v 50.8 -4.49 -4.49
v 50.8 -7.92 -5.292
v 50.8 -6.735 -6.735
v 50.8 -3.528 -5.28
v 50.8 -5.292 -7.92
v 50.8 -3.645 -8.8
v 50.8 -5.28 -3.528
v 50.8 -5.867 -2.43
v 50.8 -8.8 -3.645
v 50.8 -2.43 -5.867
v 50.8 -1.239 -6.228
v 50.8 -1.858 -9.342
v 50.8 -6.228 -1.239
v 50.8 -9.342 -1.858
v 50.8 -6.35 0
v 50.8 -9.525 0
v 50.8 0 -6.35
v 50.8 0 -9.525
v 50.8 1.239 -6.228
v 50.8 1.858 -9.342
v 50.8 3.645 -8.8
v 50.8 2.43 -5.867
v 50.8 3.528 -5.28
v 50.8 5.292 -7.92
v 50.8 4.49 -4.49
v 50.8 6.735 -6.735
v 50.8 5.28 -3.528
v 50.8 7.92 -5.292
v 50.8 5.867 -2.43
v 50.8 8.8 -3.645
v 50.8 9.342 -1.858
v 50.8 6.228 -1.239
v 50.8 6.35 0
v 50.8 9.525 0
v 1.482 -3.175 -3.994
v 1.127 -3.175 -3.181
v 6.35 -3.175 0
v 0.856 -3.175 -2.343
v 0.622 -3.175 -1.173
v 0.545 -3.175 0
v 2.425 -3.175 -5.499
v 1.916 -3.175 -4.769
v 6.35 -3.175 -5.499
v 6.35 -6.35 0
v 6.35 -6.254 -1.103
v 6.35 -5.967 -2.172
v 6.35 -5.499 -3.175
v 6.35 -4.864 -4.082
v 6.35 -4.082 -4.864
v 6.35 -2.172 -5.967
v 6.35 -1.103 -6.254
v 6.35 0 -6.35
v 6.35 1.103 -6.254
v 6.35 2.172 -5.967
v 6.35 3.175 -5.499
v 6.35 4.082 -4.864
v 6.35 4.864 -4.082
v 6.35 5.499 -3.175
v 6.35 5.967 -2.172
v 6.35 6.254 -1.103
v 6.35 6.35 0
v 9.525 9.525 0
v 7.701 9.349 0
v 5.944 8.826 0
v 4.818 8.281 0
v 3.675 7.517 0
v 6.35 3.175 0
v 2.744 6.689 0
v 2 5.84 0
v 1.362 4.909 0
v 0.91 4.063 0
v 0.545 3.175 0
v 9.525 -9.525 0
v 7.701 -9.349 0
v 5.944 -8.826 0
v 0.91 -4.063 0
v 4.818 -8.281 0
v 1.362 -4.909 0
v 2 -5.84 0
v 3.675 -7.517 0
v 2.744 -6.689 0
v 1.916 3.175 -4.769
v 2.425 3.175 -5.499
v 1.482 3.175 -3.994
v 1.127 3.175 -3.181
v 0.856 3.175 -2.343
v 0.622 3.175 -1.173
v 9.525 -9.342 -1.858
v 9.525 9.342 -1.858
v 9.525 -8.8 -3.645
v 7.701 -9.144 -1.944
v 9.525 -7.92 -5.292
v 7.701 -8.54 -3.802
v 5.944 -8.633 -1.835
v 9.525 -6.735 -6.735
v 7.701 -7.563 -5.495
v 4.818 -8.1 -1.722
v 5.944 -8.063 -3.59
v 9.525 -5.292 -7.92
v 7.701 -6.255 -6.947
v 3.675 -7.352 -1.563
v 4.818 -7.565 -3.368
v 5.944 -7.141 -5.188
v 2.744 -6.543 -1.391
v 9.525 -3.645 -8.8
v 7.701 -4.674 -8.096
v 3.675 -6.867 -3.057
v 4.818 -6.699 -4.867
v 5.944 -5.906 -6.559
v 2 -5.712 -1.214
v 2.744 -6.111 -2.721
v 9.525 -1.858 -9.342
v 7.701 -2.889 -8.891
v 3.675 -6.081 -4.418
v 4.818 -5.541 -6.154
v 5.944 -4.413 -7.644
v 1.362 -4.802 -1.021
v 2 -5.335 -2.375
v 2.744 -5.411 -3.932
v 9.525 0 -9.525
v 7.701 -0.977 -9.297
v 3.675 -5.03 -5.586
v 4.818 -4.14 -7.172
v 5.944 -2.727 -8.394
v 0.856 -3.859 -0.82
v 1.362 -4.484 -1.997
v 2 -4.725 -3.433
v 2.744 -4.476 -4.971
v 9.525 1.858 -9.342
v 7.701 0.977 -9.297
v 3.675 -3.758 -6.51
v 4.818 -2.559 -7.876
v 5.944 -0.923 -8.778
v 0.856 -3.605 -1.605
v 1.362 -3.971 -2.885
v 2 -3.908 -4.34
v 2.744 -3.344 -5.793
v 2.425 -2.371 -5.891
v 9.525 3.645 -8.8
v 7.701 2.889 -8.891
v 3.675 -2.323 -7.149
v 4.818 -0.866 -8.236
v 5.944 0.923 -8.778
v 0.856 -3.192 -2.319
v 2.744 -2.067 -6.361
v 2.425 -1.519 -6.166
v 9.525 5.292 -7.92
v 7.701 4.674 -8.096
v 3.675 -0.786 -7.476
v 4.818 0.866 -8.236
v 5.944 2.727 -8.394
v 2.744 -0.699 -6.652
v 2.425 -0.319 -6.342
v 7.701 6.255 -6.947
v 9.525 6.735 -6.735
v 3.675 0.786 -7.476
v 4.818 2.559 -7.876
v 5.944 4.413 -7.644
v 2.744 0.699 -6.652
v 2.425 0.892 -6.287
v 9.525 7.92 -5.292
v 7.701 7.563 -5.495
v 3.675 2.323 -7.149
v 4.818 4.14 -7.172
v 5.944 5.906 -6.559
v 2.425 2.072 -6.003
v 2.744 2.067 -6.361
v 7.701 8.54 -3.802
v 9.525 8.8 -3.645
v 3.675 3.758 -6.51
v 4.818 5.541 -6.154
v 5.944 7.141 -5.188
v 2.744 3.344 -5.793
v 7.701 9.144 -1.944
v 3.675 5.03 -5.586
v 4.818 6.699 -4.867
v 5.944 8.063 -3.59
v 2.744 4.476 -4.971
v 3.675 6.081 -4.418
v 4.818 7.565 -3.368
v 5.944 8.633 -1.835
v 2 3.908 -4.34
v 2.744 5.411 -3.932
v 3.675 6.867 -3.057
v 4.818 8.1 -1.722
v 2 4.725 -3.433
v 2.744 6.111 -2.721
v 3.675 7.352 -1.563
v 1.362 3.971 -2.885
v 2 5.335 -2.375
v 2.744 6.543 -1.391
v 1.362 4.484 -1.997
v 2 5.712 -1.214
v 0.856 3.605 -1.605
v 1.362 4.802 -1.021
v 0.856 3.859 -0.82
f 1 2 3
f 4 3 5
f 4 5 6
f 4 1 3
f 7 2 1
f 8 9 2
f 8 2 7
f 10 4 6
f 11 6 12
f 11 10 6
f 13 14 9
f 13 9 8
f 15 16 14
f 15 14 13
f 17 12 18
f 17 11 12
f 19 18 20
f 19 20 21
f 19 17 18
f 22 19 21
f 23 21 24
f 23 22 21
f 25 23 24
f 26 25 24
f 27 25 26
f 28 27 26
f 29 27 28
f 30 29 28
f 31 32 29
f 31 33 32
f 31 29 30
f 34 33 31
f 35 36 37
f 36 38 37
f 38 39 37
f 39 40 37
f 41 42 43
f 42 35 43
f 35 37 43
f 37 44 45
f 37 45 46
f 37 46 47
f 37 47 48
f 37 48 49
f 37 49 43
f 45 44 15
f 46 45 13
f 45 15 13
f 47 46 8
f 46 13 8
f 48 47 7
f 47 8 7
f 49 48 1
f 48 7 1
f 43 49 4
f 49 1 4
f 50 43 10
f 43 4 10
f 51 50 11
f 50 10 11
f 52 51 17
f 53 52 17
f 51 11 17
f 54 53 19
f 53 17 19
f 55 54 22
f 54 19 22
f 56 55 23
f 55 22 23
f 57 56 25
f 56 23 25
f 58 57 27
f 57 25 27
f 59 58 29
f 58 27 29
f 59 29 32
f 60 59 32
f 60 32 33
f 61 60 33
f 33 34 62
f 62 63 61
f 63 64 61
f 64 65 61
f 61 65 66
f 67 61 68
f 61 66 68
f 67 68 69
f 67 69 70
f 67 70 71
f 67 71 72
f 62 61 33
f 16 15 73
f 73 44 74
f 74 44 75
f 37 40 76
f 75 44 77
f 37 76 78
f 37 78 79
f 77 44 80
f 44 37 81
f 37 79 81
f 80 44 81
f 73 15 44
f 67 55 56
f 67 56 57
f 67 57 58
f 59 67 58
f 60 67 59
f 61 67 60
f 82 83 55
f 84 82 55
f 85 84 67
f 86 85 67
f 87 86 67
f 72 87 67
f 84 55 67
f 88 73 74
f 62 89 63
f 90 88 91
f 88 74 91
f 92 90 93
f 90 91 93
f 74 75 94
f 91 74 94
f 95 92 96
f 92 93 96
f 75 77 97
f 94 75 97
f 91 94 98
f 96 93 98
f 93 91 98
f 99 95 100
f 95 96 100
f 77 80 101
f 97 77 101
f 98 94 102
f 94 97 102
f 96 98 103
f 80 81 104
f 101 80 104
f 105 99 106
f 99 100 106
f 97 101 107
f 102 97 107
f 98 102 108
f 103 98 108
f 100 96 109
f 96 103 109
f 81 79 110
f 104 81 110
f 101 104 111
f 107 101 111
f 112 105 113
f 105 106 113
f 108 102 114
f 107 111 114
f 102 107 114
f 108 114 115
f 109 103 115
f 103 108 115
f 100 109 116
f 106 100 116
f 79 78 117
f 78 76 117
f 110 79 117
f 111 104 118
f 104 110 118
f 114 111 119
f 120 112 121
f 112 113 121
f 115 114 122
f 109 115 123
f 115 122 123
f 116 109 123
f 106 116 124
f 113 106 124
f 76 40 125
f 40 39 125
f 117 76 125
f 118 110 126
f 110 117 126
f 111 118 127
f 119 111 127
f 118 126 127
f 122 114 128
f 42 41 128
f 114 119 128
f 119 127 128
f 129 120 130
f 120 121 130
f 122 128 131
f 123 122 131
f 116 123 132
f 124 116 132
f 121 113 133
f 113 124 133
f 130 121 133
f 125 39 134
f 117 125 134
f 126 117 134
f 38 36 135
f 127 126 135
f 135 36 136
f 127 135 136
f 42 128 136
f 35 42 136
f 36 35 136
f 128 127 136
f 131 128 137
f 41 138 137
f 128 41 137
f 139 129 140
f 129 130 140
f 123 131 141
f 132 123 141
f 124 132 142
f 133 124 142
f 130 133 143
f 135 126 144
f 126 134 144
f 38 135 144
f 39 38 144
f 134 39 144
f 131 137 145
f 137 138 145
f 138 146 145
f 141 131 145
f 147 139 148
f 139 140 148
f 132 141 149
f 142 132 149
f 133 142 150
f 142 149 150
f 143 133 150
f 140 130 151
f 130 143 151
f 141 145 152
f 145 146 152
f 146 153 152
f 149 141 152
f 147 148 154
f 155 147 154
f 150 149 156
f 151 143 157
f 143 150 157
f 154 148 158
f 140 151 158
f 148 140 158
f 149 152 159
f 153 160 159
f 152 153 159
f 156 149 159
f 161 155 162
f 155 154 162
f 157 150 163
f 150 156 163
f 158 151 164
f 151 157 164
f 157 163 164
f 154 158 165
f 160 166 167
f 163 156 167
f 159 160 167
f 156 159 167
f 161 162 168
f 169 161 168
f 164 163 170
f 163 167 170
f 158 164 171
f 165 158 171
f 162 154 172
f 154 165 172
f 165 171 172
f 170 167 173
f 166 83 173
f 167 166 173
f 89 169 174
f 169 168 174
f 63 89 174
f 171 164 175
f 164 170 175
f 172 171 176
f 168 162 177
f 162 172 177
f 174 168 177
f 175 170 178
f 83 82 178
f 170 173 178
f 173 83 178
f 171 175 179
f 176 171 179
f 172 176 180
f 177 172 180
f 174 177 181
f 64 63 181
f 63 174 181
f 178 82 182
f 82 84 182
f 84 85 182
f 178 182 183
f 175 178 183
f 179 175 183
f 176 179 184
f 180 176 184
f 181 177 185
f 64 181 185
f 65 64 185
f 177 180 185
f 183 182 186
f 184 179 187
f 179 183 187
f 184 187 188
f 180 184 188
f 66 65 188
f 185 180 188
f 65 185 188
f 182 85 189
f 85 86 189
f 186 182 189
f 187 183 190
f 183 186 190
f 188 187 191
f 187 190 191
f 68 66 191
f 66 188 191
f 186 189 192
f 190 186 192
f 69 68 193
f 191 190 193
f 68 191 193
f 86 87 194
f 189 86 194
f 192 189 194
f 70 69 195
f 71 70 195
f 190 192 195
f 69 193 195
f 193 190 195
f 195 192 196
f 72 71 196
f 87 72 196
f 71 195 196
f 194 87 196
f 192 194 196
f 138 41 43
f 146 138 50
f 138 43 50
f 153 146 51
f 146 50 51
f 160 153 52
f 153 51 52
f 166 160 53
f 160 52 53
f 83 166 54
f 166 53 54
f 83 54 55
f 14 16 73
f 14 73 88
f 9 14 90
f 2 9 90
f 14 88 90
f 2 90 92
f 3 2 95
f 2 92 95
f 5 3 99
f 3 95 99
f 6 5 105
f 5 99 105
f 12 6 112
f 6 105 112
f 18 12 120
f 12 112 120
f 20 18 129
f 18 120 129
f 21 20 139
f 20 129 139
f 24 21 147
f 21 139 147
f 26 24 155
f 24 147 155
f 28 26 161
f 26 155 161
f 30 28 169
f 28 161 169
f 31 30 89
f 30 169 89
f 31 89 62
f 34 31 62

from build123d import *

# Parameters (mm, degrees)
F1_DEPTH = 50.8
F2_R     = 9.52499
F4_DEPTH = 44.45
F6_DEPTH = 6.35


# Not quite as in the source:
# - a fillet or chamfer is up to 0.001 mm smaller than in the source, because OpenCascade refuses the exact size


with BuildPart() as f1:
    # F0 (on Right) → F1 (new body)
    with BuildSketch(Plane.YZ):
        with BuildLine():
            Line((9.525, 0), (-9.525, 0))
            ThreePointArc((-9.525, 0), (0, -9.525), (9.525, 0))
        make_face()
    extrude(amount=F1_DEPTH)

    # F2 (radius 9.525 in the source; OpenCascade refuses exactly that, so slightly less here)
    f2_edges = [f1.edges().sort_by_distance(p)[0] for p in [
        (0, 0, -9.525),
    ]]
    fillet(f2_edges, radius=F2_R)

    # F3 (on face) → F4 (cut)
    with BuildSketch(Plane.YZ.offset(50.8)):
        with BuildLine():
            Line((6.35, 0), (-6.35, 0))
            ThreePointArc((-6.35, 0), (0, -6.35), (6.35, 0))
        make_face()
    extrude(amount=-F4_DEPTH, mode=Mode.SUBTRACT)

    # F5 (on face) → F6 (cut)
    with BuildSketch(Plane.YZ.offset(6.35)):
        with BuildLine():
            Line((3.175, 0), (-3.175, 0))
            Line((-3.175, 0), (-3.175, -5.499261314))
            ThreePointArc((-3.175, -5.499261314), (0, -6.35), (3.175, -5.499261314))
            Line((3.175, -5.499261314), (3.175, 0))
        make_face()
    extrude(amount=-F6_DEPTH, mode=Mode.SUBTRACT)


solid = f1.part
